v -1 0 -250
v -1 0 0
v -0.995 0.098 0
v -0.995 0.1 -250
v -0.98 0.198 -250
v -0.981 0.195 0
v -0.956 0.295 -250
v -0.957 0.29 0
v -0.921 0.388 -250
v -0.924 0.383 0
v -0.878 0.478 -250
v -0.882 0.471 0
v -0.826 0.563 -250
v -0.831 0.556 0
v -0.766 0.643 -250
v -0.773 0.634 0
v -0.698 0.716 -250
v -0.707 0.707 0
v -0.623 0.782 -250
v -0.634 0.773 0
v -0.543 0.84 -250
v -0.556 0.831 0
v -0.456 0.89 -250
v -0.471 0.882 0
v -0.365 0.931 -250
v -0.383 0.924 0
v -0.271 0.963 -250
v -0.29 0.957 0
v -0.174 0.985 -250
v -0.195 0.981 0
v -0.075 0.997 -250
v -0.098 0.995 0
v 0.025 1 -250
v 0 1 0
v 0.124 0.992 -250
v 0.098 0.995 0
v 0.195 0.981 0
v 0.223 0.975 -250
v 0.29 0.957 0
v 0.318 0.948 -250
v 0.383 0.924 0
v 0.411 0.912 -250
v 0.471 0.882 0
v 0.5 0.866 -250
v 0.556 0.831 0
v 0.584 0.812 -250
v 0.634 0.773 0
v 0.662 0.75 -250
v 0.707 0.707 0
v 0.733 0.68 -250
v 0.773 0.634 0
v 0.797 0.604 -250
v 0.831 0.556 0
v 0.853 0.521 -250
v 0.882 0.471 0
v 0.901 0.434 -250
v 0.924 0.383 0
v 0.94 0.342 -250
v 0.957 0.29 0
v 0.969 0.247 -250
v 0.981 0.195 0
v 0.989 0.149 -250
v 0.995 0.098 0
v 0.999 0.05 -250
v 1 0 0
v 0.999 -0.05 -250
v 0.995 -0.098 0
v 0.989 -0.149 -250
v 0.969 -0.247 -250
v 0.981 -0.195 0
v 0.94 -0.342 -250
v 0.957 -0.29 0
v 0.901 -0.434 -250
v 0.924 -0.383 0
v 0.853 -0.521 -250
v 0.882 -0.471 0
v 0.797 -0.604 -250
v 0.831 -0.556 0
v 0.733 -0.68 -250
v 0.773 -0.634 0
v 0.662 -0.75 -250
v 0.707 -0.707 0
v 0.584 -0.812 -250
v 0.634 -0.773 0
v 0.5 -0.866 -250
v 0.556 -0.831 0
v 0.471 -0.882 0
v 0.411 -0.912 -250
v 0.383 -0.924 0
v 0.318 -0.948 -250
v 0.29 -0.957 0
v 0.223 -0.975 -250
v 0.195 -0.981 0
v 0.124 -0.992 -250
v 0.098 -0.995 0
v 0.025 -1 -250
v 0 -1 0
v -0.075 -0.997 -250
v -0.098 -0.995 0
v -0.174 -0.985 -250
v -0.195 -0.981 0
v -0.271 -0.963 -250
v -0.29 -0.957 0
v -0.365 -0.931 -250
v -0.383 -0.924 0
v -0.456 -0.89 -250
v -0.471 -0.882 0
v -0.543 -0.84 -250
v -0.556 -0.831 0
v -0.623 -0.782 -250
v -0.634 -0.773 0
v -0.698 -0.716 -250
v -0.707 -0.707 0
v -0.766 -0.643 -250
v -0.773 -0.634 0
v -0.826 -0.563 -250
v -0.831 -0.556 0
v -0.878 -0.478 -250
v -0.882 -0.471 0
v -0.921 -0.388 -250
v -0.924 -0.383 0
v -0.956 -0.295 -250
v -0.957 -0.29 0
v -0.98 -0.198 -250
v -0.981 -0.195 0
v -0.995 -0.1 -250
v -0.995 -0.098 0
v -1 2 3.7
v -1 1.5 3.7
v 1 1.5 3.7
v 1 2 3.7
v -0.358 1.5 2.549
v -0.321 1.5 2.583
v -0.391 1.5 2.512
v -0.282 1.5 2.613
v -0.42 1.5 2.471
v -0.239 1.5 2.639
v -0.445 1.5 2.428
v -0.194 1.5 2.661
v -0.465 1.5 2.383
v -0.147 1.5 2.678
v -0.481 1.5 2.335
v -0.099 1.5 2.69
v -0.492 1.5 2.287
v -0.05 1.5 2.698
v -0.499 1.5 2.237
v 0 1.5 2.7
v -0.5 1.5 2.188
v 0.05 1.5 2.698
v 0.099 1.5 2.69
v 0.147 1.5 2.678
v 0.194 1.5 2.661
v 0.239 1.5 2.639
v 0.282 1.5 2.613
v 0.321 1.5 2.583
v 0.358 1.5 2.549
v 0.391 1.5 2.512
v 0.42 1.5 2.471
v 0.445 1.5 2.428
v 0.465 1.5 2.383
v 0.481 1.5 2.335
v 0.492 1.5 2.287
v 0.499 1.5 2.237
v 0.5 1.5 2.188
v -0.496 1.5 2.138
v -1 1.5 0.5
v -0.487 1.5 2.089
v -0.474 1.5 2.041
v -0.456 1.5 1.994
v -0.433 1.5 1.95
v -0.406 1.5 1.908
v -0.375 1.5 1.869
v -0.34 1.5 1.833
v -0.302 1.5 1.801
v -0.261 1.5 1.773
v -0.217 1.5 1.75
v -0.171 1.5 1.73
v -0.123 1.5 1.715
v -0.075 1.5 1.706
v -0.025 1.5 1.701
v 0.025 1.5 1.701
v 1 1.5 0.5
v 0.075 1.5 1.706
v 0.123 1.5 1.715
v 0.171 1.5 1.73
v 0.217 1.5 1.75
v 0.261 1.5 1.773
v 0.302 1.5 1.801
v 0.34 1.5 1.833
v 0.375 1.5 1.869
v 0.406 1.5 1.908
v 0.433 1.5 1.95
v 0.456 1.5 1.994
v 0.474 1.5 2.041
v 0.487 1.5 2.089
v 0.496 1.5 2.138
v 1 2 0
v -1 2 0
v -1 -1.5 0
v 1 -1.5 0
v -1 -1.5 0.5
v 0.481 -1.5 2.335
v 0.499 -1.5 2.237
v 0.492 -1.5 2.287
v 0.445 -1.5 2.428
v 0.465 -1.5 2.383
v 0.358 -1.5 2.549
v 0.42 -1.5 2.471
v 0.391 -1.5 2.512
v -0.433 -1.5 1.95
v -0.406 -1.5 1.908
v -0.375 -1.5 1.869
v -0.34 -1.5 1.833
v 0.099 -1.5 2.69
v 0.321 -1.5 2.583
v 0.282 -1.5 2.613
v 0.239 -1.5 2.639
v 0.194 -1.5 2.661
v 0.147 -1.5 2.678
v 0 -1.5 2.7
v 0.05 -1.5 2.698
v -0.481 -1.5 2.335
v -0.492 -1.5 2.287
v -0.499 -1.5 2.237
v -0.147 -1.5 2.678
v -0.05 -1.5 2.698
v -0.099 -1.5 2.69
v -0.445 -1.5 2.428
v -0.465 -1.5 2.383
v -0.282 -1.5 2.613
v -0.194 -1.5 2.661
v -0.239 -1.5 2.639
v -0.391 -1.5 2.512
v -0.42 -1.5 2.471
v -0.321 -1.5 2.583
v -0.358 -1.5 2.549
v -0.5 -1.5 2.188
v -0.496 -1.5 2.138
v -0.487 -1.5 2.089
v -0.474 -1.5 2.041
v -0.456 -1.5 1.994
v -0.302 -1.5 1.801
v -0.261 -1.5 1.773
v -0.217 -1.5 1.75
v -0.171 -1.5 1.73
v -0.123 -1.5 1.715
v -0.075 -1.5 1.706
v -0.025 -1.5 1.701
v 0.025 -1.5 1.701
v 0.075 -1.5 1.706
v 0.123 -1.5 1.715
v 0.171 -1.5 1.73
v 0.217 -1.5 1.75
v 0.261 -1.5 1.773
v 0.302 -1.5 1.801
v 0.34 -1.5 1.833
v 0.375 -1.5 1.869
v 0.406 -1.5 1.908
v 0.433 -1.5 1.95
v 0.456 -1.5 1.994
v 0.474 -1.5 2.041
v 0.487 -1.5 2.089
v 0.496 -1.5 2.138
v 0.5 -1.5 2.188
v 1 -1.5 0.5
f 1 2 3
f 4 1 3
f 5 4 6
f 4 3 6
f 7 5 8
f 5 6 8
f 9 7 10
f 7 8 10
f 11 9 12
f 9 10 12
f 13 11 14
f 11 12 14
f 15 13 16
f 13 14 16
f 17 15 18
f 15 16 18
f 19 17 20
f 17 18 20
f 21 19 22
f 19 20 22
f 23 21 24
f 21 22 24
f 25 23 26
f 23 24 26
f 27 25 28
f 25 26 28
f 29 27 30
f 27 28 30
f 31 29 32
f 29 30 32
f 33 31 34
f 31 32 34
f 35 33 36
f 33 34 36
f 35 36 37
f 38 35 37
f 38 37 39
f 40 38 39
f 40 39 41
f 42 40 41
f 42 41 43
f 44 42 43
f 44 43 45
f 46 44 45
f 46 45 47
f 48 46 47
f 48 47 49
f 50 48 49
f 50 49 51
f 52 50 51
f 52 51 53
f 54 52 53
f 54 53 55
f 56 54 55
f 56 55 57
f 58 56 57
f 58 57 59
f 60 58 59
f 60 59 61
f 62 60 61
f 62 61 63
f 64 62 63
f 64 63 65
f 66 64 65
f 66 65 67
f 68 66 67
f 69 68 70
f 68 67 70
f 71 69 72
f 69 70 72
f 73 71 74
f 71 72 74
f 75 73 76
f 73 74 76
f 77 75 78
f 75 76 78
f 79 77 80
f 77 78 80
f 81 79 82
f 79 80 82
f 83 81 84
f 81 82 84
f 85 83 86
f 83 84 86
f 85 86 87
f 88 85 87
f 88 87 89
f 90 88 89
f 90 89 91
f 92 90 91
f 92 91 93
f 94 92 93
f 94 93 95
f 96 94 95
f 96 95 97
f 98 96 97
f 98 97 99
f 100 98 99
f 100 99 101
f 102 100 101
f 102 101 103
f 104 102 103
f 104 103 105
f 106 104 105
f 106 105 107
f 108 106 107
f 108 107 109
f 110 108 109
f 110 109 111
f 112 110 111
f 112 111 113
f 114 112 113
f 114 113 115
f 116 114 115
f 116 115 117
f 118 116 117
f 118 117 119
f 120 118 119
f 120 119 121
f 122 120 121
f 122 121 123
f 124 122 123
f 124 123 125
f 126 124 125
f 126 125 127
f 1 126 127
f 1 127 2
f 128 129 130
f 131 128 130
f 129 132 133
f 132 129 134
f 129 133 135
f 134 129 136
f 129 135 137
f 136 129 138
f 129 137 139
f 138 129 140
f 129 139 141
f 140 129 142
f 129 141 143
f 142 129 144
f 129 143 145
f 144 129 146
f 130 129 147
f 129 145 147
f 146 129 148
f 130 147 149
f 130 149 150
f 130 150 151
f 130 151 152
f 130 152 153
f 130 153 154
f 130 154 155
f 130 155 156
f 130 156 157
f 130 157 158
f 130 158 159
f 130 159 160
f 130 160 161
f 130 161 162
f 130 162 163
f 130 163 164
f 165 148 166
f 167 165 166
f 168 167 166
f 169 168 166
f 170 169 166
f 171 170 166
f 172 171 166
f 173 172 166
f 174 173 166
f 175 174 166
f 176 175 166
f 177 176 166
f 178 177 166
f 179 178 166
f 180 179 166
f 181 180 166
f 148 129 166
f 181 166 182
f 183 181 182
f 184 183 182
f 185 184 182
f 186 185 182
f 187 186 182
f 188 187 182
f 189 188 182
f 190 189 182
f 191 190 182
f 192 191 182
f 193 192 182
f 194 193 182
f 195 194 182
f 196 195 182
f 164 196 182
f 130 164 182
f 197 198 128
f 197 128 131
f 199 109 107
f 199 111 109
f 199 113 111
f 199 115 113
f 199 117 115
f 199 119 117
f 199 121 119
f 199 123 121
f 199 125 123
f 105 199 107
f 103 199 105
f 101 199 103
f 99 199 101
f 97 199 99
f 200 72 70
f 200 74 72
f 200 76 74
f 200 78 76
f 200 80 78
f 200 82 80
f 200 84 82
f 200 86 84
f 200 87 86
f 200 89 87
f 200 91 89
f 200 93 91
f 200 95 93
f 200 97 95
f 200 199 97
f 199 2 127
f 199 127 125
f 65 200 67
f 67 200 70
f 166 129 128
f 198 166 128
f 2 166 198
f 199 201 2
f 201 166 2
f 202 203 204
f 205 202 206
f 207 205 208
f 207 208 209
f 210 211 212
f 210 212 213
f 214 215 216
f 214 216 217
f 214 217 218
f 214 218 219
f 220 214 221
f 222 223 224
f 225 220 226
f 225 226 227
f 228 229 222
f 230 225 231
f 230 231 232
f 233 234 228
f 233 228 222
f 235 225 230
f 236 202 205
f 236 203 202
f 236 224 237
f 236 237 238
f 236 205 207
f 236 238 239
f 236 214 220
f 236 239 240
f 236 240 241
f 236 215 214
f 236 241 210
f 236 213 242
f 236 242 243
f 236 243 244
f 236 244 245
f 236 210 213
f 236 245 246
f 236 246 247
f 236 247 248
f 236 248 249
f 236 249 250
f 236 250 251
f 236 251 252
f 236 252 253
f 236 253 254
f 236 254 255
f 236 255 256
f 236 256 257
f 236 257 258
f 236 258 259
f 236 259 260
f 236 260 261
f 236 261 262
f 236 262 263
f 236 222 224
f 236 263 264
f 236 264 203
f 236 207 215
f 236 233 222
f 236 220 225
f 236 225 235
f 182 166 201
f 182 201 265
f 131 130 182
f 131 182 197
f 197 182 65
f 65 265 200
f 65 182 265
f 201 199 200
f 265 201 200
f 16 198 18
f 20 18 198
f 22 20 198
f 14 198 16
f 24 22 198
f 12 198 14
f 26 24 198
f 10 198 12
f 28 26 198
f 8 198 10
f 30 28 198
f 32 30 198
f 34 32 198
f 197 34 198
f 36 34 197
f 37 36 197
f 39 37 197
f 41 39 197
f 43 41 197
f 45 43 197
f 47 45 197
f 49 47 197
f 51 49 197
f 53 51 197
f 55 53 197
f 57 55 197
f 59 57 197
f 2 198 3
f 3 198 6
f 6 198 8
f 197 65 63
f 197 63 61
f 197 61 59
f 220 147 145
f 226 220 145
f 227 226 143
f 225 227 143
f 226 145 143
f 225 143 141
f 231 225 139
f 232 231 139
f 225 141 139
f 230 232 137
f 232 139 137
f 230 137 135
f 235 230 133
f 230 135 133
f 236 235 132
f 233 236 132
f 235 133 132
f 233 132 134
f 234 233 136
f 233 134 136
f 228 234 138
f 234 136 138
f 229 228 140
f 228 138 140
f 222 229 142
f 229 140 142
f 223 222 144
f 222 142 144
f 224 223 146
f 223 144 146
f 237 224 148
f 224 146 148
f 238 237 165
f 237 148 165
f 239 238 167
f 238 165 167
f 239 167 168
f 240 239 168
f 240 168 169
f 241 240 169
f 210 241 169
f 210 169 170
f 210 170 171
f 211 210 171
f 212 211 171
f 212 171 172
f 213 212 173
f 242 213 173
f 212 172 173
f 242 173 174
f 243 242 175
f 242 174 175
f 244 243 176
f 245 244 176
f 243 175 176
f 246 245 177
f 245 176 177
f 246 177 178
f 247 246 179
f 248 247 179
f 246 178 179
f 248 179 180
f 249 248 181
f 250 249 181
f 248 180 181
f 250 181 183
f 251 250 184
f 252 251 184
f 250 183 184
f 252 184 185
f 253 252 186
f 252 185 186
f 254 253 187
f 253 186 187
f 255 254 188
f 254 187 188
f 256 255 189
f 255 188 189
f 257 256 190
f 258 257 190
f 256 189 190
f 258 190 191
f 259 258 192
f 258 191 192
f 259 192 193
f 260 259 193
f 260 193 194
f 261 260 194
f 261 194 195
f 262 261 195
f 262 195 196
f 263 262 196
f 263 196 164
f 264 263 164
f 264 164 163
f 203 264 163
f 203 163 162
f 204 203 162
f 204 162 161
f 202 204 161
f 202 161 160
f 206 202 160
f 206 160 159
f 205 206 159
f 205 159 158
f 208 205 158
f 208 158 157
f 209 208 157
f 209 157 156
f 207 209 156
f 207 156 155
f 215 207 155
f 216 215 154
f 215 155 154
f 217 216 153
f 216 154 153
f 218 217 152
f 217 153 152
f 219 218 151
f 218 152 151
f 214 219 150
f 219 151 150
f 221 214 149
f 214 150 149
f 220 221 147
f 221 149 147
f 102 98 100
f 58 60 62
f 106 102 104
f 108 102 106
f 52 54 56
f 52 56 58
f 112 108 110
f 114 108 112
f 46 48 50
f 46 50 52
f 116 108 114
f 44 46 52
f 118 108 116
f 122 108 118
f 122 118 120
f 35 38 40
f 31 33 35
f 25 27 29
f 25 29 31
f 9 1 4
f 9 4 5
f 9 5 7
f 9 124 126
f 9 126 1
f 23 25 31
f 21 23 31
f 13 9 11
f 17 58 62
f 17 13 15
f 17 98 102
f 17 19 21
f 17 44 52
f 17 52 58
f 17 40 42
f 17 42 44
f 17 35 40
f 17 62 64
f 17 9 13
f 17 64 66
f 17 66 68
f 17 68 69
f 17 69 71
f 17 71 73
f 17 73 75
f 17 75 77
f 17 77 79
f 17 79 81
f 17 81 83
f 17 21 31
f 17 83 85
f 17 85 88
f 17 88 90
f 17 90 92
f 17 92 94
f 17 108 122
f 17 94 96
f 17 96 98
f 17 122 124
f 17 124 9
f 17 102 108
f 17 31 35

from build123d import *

# Parameters (mm, degrees)
SKETCH_1_W      = 2
SKETCH_1_H      = 3
EXTRUDE_1_DEPTH = 0.5
SKETCH_2_W      = 2
SKETCH_2_H      = 3.7
EXTRUDE_2_DEPTH = 0.5
SKETCH_3_R      = 1
EXTRUDE_3_DEPTH = 250
SKETCH_4_R      = 0.5
EXTRUDE_4_DEPTH = 3


with BuildPart() as part:
    # 草图1 → 凸台-拉伸1 (new body)
    with BuildSketch(Plane.XY):
        Rectangle(SKETCH_1_W, SKETCH_1_H)
    extrude(amount=EXTRUDE_1_DEPTH)

    # 草图2 → 凸台-拉伸2 (add)
    with BuildSketch(Plane(origin=(0, 1.5, 0), x_dir=(1, 0, 0), z_dir=(0, 1, 0))):
        with Locations((0, -1.85)):
            Rectangle(SKETCH_2_W, SKETCH_2_H)
    extrude(amount=EXTRUDE_2_DEPTH)

    # 草图3 → 凸台-拉伸3 (add)
    with BuildSketch(Plane(origin=(0, 0, 0), x_dir=(-1, 0, 0), z_dir=(0, 0, -1))):
        Circle(SKETCH_3_R)
    extrude(amount=EXTRUDE_3_DEPTH)

    # 草图4 → 凸台-拉伸4 (add)
    with BuildSketch(Plane.XZ.offset(-1.5)):
        with Locations(Location((0, 2.2, 0), (0, 0, 90))):
            Circle(SKETCH_4_R)
    extrude(amount=EXTRUDE_4_DEPTH)


solid = part.part
